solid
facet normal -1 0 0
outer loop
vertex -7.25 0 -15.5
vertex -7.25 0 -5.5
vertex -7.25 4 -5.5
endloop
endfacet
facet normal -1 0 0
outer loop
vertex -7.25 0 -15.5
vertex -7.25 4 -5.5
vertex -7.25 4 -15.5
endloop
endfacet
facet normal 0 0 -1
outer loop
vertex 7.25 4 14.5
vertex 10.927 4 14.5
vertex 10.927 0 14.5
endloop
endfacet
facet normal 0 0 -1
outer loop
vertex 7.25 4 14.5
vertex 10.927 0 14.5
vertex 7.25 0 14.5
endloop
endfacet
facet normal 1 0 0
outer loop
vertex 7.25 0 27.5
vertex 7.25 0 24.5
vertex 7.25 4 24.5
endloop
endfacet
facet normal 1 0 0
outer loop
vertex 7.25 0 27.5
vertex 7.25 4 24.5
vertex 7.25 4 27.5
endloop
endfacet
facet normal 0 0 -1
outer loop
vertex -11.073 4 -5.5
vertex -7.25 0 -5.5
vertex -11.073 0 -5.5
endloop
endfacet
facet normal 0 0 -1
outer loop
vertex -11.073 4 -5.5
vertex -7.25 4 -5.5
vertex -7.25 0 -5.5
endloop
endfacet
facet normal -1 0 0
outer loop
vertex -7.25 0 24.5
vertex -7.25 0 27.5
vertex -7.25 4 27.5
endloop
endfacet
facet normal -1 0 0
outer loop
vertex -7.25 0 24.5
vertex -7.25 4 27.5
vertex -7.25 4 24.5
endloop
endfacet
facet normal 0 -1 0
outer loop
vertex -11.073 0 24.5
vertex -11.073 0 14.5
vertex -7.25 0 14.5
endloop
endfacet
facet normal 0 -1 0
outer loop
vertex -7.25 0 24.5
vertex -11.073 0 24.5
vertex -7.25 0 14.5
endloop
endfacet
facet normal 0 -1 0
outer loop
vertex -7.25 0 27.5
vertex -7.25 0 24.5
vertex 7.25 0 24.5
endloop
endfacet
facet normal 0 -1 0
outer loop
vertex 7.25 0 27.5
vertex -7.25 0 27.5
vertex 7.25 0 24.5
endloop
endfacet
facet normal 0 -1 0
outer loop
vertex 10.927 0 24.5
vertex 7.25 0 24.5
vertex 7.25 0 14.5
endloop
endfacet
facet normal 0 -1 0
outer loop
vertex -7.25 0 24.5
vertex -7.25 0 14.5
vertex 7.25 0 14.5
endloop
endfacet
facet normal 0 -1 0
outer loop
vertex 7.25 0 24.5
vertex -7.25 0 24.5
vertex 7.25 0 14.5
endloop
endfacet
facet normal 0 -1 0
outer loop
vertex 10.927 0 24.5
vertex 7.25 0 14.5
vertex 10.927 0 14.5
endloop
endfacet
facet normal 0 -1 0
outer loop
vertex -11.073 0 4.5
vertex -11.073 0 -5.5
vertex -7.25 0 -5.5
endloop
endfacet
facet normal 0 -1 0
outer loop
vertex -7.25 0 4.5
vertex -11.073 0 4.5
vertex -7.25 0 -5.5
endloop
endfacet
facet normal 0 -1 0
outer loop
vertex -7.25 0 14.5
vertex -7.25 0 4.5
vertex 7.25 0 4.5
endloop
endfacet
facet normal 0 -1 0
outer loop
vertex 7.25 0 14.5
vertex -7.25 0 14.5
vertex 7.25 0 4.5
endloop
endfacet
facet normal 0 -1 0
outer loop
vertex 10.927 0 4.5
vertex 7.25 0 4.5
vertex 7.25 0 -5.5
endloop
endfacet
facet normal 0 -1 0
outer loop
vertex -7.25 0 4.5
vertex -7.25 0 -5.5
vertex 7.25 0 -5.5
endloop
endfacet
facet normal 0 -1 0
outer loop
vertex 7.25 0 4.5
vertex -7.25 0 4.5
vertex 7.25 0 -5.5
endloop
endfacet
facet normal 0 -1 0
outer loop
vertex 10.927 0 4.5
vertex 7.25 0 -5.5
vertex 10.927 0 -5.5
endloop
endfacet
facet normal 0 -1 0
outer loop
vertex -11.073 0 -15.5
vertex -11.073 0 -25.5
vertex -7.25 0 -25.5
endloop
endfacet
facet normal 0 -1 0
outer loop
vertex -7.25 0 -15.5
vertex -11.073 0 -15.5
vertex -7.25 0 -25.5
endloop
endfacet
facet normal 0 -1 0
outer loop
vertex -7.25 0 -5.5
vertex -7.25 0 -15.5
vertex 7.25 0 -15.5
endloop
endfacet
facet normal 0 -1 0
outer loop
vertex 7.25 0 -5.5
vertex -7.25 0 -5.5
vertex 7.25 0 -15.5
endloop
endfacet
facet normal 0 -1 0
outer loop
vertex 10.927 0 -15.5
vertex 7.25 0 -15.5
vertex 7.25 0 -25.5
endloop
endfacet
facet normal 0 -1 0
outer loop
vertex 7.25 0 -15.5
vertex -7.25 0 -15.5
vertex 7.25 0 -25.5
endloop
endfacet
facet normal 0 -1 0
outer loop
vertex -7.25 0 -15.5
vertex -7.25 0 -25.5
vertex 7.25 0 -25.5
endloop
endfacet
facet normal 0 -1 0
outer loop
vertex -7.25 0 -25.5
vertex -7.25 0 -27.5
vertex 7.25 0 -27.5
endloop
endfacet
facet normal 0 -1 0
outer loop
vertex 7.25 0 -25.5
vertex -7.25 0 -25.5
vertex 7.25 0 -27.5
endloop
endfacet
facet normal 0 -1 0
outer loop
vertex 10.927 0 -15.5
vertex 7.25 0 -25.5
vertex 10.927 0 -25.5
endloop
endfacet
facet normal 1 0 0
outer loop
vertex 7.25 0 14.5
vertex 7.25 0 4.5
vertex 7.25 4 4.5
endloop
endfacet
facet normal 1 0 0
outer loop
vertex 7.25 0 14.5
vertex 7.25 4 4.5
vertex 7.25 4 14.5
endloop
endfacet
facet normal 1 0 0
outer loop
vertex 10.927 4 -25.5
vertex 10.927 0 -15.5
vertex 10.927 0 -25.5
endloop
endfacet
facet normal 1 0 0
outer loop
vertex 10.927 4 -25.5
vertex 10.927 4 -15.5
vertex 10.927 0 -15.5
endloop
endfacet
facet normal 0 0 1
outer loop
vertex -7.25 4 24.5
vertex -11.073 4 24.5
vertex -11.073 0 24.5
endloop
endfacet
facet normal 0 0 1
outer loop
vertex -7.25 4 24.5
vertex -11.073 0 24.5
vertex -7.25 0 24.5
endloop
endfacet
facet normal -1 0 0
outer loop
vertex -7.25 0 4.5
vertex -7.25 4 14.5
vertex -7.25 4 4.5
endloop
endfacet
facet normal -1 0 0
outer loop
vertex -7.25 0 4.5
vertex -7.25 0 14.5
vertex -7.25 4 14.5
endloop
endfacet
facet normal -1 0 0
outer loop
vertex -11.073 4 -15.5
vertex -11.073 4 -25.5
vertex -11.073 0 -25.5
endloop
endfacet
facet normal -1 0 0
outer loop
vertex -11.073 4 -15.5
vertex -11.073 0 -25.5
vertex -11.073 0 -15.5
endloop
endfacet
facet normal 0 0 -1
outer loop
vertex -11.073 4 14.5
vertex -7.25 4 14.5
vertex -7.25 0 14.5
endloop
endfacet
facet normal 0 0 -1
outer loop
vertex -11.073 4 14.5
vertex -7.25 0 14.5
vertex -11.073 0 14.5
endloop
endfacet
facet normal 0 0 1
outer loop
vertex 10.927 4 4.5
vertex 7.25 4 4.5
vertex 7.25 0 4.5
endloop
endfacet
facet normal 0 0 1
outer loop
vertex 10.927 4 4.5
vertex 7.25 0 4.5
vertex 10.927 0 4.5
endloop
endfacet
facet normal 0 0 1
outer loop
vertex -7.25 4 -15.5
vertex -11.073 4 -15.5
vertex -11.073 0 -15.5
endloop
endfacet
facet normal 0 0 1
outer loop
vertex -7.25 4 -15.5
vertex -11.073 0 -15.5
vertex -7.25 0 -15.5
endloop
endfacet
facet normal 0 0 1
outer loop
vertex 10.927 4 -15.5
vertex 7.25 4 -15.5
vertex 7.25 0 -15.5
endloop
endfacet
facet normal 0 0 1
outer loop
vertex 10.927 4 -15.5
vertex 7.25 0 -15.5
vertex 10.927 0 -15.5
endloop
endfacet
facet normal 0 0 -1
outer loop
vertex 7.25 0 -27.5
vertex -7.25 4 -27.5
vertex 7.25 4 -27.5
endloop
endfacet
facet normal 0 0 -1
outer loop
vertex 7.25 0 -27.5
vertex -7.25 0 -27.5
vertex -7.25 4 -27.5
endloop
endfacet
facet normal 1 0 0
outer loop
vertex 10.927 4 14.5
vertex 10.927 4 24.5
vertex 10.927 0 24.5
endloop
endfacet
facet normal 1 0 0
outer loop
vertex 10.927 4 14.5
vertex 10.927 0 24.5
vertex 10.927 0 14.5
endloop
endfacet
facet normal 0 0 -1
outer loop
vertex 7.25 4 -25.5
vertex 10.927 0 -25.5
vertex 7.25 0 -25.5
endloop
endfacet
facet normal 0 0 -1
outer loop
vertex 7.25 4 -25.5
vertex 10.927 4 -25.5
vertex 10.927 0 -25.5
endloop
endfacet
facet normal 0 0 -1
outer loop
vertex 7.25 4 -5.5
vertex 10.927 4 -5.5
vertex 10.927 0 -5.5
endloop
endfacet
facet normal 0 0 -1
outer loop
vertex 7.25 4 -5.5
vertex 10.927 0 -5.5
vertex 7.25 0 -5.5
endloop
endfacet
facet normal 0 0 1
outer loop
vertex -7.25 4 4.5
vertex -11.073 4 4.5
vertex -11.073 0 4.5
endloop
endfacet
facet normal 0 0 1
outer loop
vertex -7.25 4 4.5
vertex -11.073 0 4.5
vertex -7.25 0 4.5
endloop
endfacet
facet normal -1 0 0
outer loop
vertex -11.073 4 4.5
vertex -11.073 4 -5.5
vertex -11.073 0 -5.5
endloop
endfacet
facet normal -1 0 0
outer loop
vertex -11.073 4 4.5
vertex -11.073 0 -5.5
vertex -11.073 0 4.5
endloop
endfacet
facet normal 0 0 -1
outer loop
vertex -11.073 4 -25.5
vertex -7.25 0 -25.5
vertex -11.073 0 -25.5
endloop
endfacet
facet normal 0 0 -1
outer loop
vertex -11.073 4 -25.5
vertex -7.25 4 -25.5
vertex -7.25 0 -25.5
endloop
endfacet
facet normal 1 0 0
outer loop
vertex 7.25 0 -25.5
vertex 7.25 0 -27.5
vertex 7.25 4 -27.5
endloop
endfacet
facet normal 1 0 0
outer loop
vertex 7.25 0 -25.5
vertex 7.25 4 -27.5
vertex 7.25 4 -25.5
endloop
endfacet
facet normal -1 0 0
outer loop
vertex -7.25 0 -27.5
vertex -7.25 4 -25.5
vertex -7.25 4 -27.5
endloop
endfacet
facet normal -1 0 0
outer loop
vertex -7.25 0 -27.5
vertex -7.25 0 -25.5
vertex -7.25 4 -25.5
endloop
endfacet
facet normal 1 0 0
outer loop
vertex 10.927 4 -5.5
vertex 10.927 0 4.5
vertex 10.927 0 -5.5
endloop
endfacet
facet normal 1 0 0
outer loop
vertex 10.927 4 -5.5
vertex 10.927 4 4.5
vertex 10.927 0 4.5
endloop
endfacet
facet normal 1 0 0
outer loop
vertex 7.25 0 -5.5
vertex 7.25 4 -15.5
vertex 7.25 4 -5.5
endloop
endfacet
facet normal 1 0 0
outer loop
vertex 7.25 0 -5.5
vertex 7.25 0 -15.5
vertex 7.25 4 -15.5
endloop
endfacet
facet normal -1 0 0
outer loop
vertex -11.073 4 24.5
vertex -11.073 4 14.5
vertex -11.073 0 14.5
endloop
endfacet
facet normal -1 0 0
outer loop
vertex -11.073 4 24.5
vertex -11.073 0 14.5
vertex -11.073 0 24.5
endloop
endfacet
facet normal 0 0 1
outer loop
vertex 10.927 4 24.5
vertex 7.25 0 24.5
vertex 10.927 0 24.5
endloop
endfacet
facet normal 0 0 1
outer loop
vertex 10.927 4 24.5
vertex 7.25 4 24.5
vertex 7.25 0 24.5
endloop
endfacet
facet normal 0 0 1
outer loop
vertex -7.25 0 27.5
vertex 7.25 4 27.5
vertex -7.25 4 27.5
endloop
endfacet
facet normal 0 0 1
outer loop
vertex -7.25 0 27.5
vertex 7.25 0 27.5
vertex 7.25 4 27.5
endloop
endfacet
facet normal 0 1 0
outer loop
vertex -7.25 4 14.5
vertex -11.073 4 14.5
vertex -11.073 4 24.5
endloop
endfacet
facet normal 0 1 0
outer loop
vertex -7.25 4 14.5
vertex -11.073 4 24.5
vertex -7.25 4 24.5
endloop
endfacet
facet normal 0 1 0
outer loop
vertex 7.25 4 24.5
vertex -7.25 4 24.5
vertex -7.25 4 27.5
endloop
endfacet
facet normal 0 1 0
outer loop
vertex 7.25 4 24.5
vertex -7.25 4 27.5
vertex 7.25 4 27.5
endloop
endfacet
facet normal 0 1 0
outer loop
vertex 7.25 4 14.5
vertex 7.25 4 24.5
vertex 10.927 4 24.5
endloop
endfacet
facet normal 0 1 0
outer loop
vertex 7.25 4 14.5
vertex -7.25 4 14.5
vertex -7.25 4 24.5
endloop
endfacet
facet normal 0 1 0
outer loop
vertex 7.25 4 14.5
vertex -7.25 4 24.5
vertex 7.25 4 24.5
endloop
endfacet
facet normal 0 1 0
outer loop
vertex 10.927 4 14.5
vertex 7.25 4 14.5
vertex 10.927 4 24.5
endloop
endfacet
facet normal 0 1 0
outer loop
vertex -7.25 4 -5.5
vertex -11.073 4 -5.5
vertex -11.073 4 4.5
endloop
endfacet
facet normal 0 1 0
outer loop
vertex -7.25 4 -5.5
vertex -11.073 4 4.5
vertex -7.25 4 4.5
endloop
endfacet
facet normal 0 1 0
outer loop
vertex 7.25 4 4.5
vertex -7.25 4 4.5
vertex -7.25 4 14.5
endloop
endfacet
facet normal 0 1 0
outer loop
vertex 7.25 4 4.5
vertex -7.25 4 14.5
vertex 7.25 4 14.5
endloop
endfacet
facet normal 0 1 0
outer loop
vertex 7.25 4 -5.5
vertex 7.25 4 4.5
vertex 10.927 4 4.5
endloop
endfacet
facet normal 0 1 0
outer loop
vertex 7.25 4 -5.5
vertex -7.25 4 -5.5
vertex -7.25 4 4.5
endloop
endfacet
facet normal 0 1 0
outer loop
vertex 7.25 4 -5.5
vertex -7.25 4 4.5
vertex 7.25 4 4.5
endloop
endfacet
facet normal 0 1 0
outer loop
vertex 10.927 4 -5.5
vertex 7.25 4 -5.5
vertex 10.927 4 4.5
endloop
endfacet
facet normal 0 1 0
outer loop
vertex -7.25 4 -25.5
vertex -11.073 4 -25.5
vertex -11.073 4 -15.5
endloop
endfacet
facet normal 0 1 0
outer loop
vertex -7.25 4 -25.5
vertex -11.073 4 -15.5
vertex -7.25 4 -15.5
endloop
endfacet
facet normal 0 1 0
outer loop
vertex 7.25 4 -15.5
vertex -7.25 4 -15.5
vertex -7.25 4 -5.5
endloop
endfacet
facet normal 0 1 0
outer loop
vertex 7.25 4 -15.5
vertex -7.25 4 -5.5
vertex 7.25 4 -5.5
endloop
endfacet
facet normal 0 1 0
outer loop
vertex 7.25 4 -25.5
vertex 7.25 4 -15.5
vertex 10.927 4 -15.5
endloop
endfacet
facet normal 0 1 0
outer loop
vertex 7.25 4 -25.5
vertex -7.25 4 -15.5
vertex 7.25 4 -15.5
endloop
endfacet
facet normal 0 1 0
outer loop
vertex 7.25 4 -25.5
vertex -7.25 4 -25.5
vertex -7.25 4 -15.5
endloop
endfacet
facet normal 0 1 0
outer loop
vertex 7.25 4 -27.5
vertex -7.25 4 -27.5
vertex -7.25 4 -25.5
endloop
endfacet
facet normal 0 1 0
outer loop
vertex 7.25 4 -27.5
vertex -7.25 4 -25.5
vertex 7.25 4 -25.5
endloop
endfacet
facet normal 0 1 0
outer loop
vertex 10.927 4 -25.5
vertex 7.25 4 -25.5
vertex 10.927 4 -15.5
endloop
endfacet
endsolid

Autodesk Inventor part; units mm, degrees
ref_plane "YZ Plane" through (0, 0, 0) normal (1, 0, 0) x (0, 1, 0)
ref_plane "XZ Plane" through (0, 0, 0) normal (0, 1, 0) x (-1, 0, 0)
ref_plane "XY Plane" through (0, 0, 0) normal (0, 0, 1) x (1, 0, 0)
sketch "Sketch1" plane through (0, 0, 0) normal (0, 1, 0) x (-1, 0, 0)
  line L0 (-7.25, 27.5) -> (7.25, 27.5)
  line L1 (7.25, 27.5) -> (7.25, -27.5)
  line L2 (7.25, -27.5) -> (-7.25, -27.5)
  line L3 (-7.25, -27.5) -> (-7.25, 27.5)
  line L4 (-7.25, 27.5) -> (7.25, -27.5) construction
  line L5 (7.25, 27.5) -> (-7.25, -27.5) construction
  point P0 (0, 0)
  dimension "d0" = 14.5
  dimension "d1" = 55
extrude "Extrusion1" add sketch "Sketch1" along normal blind 4
sketch "Sketch2" plane through (0, 4, 0) normal (0, 1, 0) x (1, 0, 0)
  line L0 (0, -21.4425) -> (0, 24.9563)
  line L1 (6.9273, -24.5) -> (10.9273, -24.5)
  line L2 (10.9273, -24.5) -> (10.9273, -14.5)
  line L3 (10.9273, -14.5) -> (6.9273, -14.5)
  line L4 (6.9273, -14.5) -> (6.9273, -24.5)
  line L5 (7.25, -27.5) -> (-7.25, -27.5) projected
  point P0 (0, 0)
  dimension "d10" = 4
  dimension "d11" = 10
  dimension "d12" = 3
extrude "Extrusion2" add sketch "Sketch2" against normal blind 4
pattern_linear "Rectangular Pattern1" count 3 spacing 20 along (0, 0, -1) count 2 spacing 18 along (-1, 0, 0) of "Extrusion2"
properties part number "tussenplaatje"
